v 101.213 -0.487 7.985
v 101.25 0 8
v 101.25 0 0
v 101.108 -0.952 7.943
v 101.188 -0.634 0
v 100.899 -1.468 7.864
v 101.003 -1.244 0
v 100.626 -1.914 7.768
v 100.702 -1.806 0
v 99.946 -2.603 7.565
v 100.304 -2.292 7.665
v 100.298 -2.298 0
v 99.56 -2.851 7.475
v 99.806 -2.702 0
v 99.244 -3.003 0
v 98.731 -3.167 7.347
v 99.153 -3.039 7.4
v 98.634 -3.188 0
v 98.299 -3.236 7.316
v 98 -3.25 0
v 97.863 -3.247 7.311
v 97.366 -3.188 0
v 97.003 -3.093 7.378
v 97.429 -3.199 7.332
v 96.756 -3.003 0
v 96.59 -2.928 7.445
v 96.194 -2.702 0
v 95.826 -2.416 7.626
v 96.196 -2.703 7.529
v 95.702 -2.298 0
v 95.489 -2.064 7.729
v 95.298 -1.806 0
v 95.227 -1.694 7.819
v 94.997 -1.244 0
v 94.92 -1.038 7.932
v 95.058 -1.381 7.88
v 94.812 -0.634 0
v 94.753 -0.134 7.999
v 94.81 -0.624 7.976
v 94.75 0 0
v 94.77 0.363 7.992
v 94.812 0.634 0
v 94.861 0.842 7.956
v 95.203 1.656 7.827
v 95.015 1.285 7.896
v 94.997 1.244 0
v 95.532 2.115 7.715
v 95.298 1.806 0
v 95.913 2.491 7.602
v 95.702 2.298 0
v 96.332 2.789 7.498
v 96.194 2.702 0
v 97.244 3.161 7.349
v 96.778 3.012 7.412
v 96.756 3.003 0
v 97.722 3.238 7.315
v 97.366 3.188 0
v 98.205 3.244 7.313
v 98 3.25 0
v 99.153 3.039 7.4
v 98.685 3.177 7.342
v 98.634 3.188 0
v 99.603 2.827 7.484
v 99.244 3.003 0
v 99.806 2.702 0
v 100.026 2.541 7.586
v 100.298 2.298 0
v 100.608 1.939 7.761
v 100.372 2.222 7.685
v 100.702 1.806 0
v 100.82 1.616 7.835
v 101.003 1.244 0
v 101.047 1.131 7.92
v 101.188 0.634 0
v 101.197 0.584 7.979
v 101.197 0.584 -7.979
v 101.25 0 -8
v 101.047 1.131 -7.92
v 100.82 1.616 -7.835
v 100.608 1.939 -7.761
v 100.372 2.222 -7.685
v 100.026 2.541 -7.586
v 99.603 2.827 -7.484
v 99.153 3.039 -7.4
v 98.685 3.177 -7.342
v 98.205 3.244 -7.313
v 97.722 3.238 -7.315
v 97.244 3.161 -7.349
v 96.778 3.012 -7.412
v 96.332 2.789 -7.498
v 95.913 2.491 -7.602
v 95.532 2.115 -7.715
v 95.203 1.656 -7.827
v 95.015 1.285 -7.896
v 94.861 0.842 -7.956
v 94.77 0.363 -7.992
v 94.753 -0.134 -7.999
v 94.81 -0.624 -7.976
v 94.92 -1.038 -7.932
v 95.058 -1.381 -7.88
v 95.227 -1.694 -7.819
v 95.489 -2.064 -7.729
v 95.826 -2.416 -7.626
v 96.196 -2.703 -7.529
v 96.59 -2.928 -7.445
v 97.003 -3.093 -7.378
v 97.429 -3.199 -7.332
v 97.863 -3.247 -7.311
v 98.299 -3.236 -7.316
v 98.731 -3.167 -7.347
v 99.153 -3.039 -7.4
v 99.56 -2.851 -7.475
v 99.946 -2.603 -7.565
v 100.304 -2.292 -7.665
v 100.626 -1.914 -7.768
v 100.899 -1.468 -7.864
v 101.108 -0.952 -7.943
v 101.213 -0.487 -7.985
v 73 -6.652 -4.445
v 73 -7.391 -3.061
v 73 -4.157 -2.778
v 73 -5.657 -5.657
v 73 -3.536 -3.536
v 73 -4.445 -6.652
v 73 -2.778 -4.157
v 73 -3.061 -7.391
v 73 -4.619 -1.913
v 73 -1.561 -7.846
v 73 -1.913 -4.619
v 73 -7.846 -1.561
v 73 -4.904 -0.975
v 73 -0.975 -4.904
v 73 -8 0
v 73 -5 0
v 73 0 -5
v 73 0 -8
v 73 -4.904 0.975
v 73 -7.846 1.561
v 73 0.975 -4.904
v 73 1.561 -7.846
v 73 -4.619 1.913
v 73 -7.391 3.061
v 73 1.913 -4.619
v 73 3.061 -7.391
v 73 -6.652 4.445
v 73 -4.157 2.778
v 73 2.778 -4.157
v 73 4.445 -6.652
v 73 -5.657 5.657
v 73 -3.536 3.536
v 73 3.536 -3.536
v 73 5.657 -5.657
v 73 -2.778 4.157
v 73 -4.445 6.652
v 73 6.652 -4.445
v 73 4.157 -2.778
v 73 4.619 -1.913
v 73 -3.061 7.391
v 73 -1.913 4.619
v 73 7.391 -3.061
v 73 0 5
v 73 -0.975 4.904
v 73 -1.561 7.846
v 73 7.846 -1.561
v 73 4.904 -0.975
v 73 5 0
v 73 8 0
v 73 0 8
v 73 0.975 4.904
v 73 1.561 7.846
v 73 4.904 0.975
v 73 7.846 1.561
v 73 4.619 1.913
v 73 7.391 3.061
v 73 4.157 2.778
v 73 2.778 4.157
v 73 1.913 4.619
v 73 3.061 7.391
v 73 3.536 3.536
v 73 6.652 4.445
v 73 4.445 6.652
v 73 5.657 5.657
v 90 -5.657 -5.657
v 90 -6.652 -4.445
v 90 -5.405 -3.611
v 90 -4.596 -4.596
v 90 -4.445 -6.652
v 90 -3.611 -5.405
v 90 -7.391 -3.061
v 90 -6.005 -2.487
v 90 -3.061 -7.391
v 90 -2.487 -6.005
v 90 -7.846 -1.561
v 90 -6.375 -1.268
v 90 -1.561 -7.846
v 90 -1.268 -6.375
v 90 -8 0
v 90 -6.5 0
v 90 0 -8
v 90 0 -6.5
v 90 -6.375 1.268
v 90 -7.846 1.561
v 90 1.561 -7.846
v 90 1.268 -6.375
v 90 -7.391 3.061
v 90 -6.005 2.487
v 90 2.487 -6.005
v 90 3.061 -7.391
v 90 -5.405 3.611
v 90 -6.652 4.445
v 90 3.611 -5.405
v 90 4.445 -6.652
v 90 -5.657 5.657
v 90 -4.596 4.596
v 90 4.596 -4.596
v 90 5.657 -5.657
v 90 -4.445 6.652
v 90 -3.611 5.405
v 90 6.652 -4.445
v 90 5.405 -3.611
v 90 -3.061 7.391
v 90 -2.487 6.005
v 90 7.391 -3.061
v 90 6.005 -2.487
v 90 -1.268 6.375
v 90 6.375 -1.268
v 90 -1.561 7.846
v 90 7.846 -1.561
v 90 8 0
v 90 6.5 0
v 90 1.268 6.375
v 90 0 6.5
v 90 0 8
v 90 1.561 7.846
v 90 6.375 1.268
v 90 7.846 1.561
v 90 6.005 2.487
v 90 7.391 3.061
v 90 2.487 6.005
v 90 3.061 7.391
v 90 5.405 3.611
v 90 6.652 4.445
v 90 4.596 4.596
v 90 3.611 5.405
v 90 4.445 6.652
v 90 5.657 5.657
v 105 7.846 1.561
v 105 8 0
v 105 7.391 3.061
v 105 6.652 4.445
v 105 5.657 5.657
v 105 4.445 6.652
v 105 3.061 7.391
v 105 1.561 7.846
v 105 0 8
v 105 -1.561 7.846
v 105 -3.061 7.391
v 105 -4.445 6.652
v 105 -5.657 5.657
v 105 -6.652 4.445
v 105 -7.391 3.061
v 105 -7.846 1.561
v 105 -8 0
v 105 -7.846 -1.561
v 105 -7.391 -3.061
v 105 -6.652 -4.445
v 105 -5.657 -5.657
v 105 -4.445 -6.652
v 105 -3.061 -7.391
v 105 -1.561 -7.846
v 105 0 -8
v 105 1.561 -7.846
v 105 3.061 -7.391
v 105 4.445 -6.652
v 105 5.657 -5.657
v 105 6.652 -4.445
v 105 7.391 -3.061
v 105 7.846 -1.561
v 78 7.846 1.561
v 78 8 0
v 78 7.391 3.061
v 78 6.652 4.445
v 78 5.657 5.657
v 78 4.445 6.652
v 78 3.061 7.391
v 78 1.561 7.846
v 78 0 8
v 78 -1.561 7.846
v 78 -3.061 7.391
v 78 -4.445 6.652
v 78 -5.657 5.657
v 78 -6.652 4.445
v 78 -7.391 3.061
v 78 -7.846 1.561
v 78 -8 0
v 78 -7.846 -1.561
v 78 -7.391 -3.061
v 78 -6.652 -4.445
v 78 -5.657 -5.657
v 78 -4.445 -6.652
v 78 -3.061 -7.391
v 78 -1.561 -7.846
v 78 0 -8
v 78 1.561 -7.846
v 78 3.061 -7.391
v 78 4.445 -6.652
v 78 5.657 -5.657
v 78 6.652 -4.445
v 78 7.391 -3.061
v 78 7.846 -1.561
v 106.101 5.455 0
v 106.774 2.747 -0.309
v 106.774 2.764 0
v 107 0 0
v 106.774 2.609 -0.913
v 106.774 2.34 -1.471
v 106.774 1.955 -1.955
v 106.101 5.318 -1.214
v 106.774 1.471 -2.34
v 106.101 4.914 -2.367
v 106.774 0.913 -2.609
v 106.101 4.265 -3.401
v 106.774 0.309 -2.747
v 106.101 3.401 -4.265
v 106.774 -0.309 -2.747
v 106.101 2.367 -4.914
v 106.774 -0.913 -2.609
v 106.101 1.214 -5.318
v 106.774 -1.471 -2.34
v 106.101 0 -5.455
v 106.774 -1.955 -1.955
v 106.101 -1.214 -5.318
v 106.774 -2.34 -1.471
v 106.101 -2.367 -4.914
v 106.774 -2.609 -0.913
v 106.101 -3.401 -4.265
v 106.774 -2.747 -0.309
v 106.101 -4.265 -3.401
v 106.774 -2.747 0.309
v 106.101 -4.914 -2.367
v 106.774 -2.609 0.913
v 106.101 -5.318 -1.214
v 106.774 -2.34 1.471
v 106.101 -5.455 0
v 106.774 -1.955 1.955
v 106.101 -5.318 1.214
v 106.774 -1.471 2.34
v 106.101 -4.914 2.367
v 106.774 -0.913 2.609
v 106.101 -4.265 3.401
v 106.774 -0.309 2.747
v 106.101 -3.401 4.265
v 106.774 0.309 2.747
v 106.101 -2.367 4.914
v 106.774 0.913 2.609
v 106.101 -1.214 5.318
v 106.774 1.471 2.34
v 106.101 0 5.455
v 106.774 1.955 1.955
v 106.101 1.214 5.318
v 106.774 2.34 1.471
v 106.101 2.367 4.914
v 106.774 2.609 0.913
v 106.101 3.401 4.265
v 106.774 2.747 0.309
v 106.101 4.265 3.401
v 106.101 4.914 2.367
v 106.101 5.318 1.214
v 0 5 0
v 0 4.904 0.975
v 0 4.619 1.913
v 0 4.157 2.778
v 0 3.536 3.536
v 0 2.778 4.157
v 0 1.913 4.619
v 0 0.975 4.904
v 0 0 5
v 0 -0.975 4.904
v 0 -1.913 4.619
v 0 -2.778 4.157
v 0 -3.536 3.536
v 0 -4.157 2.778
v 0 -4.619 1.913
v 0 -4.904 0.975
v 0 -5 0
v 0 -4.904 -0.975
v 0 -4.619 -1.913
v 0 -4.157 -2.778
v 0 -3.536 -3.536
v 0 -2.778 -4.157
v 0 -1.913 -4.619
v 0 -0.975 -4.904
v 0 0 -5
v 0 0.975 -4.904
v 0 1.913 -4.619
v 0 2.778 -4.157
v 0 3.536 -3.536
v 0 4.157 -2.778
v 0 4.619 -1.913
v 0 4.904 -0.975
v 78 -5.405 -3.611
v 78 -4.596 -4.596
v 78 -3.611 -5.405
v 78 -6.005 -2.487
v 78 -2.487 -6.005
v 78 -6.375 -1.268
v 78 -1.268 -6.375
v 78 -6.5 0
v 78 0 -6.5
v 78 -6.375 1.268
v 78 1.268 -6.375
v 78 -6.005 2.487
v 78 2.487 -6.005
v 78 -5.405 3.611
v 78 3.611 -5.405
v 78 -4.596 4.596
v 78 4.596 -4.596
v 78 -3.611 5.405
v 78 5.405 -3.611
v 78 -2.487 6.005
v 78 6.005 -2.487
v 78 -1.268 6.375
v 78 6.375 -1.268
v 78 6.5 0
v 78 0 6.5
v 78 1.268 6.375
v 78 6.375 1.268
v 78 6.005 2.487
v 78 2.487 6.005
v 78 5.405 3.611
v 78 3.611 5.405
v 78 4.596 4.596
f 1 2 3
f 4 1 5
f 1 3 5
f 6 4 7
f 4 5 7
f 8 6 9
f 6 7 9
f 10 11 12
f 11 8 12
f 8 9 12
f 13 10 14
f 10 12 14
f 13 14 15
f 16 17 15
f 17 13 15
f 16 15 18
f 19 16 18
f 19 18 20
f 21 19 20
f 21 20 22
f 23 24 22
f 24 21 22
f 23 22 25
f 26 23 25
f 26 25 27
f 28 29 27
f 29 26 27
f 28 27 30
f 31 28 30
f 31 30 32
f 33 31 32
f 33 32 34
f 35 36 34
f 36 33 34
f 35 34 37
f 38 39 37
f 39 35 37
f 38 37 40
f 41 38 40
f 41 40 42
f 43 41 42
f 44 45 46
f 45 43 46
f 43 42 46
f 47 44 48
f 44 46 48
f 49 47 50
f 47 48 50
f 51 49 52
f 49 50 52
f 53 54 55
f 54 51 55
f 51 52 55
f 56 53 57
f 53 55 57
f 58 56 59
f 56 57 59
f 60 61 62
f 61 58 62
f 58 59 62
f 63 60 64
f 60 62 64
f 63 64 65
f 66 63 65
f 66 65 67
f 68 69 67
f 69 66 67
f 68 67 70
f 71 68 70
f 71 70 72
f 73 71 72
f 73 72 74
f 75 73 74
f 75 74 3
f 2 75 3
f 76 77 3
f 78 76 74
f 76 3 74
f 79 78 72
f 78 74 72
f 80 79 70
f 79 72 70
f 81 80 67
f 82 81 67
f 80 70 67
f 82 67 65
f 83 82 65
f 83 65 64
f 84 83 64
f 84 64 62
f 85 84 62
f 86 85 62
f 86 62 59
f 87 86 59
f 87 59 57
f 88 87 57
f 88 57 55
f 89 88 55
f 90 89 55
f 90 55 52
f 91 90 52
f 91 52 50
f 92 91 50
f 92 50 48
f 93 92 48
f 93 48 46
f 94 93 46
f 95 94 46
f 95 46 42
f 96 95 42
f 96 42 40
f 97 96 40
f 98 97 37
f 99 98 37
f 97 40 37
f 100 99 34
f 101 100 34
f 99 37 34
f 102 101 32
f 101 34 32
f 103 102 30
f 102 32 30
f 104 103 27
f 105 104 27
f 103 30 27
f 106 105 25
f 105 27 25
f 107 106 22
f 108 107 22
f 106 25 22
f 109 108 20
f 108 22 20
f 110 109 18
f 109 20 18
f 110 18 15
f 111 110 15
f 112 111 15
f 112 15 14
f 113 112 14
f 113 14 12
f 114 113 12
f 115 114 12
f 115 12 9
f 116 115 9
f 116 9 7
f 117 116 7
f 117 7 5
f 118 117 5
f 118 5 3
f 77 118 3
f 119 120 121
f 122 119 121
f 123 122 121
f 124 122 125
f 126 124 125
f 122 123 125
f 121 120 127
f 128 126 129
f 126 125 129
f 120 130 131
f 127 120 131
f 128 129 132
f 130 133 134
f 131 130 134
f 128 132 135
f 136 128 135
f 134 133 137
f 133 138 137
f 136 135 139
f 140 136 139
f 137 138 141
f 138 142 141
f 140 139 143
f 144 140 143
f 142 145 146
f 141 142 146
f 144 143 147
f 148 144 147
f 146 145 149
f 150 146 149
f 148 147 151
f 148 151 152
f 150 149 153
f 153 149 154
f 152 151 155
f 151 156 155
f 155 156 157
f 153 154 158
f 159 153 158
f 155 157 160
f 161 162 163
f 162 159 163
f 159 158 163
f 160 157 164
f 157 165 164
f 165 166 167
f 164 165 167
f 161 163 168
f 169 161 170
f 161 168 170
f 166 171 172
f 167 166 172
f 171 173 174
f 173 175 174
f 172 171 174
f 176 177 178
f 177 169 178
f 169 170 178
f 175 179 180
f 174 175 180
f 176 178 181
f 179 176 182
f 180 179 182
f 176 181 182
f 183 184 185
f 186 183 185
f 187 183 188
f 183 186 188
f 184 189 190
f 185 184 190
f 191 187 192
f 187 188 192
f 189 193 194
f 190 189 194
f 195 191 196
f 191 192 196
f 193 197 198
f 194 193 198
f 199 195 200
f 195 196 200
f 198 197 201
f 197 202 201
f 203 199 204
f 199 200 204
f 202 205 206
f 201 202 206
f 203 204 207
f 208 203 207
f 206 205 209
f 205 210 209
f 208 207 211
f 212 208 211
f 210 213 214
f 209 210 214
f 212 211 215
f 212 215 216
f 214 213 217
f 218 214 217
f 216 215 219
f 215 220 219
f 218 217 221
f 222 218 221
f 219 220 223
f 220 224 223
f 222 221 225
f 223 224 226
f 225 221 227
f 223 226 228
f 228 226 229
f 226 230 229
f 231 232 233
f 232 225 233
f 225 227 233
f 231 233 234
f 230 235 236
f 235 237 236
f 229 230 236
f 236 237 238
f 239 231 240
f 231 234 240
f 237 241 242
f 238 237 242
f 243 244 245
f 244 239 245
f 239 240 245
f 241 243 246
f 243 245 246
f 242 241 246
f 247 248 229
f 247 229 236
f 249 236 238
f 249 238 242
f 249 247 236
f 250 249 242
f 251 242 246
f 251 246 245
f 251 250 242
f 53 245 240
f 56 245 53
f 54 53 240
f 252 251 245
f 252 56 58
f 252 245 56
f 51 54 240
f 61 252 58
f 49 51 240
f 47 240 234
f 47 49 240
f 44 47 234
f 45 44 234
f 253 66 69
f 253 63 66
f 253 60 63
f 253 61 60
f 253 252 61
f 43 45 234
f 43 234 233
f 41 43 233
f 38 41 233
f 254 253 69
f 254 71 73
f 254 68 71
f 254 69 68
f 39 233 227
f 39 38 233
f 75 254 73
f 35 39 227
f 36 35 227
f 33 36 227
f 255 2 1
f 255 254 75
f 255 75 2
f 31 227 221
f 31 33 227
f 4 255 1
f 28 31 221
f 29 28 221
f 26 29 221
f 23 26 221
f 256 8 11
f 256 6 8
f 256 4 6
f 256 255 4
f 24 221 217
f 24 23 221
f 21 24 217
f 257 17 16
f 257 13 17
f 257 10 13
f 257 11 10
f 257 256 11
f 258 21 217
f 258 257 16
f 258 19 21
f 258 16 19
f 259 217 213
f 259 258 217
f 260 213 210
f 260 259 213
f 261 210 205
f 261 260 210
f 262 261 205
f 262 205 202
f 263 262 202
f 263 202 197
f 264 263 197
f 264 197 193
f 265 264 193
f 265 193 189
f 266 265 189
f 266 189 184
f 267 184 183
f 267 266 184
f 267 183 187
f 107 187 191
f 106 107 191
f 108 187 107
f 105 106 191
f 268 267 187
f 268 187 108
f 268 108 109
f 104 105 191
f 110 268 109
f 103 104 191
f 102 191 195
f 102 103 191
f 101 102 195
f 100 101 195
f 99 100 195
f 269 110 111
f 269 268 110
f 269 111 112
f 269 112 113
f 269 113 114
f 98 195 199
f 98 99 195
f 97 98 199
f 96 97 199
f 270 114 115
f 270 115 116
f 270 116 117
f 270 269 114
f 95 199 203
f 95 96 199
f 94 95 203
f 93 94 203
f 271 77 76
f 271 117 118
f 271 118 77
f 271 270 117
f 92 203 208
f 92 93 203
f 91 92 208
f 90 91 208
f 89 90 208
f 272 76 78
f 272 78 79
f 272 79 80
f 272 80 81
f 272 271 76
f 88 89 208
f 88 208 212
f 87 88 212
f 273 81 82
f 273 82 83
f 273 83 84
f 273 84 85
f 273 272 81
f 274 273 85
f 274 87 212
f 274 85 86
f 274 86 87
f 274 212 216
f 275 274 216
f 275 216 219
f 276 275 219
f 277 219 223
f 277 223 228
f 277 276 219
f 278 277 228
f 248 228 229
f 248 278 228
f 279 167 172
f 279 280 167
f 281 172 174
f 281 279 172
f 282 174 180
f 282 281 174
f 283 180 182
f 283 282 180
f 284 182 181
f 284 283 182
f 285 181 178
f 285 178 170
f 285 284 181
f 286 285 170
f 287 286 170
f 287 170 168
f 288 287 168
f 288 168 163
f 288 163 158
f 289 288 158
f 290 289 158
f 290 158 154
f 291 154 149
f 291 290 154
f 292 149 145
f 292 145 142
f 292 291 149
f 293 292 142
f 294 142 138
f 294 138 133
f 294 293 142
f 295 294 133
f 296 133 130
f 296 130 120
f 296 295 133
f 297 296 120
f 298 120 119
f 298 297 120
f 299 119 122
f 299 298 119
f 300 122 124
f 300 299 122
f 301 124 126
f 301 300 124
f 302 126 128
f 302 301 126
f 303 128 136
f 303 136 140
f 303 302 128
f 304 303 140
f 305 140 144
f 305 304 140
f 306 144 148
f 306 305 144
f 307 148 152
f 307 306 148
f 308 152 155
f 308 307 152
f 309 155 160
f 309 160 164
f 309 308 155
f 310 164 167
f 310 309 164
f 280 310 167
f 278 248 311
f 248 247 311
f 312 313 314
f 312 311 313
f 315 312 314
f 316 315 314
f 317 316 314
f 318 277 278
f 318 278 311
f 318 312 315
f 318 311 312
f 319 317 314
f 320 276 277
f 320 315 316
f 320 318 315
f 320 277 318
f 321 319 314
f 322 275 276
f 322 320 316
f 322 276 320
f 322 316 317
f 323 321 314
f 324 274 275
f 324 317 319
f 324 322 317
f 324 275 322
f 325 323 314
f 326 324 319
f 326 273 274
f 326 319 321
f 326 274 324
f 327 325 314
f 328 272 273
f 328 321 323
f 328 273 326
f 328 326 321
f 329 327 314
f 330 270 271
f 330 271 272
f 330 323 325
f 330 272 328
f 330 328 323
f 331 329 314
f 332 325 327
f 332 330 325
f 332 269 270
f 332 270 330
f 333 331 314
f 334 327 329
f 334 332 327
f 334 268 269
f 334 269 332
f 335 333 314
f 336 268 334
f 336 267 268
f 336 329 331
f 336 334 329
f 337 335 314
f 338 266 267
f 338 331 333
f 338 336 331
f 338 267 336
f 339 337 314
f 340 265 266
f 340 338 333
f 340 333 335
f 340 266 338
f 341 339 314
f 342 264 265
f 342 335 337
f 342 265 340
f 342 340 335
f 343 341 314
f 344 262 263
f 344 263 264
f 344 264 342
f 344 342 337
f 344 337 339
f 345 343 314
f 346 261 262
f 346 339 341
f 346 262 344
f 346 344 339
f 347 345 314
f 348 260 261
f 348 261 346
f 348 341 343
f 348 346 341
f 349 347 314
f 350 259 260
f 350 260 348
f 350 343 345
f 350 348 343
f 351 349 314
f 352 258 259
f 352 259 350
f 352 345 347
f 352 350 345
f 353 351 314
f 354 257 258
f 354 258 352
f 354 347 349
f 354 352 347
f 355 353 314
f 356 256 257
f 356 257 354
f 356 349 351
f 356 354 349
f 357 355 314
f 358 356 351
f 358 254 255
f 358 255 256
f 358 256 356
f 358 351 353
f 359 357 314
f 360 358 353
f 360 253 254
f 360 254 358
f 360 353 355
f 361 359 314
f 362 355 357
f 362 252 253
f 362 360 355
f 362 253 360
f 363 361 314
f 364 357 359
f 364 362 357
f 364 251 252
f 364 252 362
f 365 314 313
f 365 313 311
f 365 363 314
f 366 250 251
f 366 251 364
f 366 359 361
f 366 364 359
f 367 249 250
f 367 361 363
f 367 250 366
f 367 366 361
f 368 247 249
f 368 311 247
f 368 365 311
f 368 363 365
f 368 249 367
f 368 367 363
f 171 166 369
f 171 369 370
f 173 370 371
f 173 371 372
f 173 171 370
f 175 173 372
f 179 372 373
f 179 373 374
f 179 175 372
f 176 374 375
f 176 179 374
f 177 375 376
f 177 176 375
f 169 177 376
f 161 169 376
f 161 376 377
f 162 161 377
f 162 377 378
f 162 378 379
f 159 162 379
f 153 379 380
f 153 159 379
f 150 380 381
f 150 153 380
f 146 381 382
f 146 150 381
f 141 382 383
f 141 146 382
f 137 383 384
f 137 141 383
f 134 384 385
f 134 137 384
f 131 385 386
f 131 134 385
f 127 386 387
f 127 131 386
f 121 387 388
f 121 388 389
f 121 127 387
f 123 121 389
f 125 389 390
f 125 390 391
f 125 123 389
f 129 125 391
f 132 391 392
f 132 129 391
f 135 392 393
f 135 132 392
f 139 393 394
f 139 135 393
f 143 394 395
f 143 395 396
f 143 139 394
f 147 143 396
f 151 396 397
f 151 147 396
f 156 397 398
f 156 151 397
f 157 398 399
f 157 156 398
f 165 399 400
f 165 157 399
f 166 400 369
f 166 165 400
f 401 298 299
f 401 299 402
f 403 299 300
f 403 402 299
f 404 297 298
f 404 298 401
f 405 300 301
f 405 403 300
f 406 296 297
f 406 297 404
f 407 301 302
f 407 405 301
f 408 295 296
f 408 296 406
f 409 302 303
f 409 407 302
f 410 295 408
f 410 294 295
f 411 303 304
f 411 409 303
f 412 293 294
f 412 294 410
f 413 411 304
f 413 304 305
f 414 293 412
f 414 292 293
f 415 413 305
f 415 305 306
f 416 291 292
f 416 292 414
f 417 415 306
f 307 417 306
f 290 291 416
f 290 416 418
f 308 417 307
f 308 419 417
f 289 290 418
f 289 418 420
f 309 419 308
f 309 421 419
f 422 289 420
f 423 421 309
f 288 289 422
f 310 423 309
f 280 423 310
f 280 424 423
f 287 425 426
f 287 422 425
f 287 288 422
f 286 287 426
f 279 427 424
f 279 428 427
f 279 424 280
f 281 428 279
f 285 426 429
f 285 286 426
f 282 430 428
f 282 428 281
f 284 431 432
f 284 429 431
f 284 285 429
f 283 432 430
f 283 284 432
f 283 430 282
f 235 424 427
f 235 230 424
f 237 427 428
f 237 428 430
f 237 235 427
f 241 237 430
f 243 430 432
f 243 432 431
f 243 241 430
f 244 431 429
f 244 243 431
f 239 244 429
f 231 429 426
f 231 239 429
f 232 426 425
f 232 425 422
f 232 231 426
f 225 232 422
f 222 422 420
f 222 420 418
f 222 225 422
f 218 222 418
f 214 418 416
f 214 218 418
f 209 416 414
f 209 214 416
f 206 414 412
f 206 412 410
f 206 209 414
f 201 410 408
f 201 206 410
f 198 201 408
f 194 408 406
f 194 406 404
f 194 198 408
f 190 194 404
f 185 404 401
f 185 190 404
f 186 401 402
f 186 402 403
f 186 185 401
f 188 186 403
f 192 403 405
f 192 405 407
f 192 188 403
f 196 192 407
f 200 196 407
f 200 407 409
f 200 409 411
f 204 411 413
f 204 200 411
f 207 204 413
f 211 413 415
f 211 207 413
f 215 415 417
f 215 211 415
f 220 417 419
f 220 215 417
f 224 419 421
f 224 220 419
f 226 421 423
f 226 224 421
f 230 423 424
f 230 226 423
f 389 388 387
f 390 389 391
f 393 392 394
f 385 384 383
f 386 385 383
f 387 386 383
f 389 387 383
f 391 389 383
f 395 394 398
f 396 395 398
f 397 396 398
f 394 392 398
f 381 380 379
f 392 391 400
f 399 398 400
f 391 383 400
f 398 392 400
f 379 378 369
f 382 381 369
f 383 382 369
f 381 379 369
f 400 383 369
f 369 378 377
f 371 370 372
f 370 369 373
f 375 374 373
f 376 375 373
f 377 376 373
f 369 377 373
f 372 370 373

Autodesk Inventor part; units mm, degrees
ref_plane "YZ Plane" through (0, 0, 0) normal (1, 0, 0) x (0, 1, 0)
ref_plane "XZ Plane" through (0, 0, 0) normal (0, 1, 0) x (-1, 0, 0)
ref_plane "XY Plane" through (0, 0, 0) normal (0, 0, 1) x (1, 0, 0)
sketch "Esboço1" plane through (0, 0, 0) normal (0, 0, 1) x (1, 0, 0)
  line L0 (0, 0) -> (107, 0)
  line L1 (0, 0) -> (0, 5)
  line L2 (0, 5) -> (73, 5)
  line L3 (73, 5) -> (73, 8)
  line L4 (73, 8) -> (78, 8)
  line L5 (78, 8) -> (78, 6.5)
  line L6 (78, 6.5) -> (90, 6.5)
  line L7 (90, 6.5) -> (90, 8)
  line L8 (90, 8) -> (105, 8)
  arc A0 (107, 0) -> (105, 8) centre (90, 0) ccw
  dimension "d0" = 107
  dimension "d2" = 73
  dimension "d4" = 5
  dimension "d6" = 12
  dimension "d8" = 15
  dimension "d9" = 10
  dimension "d10" = 16
  dimension "d11" = 13
  dimension "d12" = 16
revolve "Revolução1" add sketch "Esboço1" angle 360 about axis through (0, 0, 0) along (1, 0, 0)
thread "Rosca1" size "M10x1.5" class "6g" standard "ISO Metric profile" full length
sketch "Esboço2" plane through (0, 0, 0) normal (0, 0, 1) x (1, 0, 0)
  circle A0 centre (98, 0) radius 3.25
  line L0 (0, -5) -> (0, 5) projected
  line L1 (0, 5) -> (73, 5) projected
  line L2 (73, 5) -> (73, 8) projected
  line L3 (73, 8) -> (78, 8) projected
  line L4 (78, 8) -> (78, 6.5) projected
  line L5 (78, 6.5) -> (90, 6.5) projected
  line L6 (90, 6.5) -> (90, 8) projected
  line L7 (90, 8) -> (105, 8) projected
  arc A1 (105, -8) -> (105, 8) centre (90, 0) ccw projected
  line L8 (105, -8) -> (90, -8) projected
  line L9 (90, -8) -> (90, -6.5) projected
  line L10 (90, -6.5) -> (78, -6.5) projected
  line L11 (78, -6.5) -> (78, -8) projected
  line L12 (78, -8) -> (73, -8) projected
  line L13 (73, -8) -> (73, -5) projected
  line L14 (73, -5) -> (0, -5) projected
  point P0 (0, 0)
  dimension "d16" = 6.5
  dimension "d17" = 7
extrude "Extrusão1" cut sketch "Esboço2" along normal through all both and the other way through all contours A0
properties part number "Parafuso1"
